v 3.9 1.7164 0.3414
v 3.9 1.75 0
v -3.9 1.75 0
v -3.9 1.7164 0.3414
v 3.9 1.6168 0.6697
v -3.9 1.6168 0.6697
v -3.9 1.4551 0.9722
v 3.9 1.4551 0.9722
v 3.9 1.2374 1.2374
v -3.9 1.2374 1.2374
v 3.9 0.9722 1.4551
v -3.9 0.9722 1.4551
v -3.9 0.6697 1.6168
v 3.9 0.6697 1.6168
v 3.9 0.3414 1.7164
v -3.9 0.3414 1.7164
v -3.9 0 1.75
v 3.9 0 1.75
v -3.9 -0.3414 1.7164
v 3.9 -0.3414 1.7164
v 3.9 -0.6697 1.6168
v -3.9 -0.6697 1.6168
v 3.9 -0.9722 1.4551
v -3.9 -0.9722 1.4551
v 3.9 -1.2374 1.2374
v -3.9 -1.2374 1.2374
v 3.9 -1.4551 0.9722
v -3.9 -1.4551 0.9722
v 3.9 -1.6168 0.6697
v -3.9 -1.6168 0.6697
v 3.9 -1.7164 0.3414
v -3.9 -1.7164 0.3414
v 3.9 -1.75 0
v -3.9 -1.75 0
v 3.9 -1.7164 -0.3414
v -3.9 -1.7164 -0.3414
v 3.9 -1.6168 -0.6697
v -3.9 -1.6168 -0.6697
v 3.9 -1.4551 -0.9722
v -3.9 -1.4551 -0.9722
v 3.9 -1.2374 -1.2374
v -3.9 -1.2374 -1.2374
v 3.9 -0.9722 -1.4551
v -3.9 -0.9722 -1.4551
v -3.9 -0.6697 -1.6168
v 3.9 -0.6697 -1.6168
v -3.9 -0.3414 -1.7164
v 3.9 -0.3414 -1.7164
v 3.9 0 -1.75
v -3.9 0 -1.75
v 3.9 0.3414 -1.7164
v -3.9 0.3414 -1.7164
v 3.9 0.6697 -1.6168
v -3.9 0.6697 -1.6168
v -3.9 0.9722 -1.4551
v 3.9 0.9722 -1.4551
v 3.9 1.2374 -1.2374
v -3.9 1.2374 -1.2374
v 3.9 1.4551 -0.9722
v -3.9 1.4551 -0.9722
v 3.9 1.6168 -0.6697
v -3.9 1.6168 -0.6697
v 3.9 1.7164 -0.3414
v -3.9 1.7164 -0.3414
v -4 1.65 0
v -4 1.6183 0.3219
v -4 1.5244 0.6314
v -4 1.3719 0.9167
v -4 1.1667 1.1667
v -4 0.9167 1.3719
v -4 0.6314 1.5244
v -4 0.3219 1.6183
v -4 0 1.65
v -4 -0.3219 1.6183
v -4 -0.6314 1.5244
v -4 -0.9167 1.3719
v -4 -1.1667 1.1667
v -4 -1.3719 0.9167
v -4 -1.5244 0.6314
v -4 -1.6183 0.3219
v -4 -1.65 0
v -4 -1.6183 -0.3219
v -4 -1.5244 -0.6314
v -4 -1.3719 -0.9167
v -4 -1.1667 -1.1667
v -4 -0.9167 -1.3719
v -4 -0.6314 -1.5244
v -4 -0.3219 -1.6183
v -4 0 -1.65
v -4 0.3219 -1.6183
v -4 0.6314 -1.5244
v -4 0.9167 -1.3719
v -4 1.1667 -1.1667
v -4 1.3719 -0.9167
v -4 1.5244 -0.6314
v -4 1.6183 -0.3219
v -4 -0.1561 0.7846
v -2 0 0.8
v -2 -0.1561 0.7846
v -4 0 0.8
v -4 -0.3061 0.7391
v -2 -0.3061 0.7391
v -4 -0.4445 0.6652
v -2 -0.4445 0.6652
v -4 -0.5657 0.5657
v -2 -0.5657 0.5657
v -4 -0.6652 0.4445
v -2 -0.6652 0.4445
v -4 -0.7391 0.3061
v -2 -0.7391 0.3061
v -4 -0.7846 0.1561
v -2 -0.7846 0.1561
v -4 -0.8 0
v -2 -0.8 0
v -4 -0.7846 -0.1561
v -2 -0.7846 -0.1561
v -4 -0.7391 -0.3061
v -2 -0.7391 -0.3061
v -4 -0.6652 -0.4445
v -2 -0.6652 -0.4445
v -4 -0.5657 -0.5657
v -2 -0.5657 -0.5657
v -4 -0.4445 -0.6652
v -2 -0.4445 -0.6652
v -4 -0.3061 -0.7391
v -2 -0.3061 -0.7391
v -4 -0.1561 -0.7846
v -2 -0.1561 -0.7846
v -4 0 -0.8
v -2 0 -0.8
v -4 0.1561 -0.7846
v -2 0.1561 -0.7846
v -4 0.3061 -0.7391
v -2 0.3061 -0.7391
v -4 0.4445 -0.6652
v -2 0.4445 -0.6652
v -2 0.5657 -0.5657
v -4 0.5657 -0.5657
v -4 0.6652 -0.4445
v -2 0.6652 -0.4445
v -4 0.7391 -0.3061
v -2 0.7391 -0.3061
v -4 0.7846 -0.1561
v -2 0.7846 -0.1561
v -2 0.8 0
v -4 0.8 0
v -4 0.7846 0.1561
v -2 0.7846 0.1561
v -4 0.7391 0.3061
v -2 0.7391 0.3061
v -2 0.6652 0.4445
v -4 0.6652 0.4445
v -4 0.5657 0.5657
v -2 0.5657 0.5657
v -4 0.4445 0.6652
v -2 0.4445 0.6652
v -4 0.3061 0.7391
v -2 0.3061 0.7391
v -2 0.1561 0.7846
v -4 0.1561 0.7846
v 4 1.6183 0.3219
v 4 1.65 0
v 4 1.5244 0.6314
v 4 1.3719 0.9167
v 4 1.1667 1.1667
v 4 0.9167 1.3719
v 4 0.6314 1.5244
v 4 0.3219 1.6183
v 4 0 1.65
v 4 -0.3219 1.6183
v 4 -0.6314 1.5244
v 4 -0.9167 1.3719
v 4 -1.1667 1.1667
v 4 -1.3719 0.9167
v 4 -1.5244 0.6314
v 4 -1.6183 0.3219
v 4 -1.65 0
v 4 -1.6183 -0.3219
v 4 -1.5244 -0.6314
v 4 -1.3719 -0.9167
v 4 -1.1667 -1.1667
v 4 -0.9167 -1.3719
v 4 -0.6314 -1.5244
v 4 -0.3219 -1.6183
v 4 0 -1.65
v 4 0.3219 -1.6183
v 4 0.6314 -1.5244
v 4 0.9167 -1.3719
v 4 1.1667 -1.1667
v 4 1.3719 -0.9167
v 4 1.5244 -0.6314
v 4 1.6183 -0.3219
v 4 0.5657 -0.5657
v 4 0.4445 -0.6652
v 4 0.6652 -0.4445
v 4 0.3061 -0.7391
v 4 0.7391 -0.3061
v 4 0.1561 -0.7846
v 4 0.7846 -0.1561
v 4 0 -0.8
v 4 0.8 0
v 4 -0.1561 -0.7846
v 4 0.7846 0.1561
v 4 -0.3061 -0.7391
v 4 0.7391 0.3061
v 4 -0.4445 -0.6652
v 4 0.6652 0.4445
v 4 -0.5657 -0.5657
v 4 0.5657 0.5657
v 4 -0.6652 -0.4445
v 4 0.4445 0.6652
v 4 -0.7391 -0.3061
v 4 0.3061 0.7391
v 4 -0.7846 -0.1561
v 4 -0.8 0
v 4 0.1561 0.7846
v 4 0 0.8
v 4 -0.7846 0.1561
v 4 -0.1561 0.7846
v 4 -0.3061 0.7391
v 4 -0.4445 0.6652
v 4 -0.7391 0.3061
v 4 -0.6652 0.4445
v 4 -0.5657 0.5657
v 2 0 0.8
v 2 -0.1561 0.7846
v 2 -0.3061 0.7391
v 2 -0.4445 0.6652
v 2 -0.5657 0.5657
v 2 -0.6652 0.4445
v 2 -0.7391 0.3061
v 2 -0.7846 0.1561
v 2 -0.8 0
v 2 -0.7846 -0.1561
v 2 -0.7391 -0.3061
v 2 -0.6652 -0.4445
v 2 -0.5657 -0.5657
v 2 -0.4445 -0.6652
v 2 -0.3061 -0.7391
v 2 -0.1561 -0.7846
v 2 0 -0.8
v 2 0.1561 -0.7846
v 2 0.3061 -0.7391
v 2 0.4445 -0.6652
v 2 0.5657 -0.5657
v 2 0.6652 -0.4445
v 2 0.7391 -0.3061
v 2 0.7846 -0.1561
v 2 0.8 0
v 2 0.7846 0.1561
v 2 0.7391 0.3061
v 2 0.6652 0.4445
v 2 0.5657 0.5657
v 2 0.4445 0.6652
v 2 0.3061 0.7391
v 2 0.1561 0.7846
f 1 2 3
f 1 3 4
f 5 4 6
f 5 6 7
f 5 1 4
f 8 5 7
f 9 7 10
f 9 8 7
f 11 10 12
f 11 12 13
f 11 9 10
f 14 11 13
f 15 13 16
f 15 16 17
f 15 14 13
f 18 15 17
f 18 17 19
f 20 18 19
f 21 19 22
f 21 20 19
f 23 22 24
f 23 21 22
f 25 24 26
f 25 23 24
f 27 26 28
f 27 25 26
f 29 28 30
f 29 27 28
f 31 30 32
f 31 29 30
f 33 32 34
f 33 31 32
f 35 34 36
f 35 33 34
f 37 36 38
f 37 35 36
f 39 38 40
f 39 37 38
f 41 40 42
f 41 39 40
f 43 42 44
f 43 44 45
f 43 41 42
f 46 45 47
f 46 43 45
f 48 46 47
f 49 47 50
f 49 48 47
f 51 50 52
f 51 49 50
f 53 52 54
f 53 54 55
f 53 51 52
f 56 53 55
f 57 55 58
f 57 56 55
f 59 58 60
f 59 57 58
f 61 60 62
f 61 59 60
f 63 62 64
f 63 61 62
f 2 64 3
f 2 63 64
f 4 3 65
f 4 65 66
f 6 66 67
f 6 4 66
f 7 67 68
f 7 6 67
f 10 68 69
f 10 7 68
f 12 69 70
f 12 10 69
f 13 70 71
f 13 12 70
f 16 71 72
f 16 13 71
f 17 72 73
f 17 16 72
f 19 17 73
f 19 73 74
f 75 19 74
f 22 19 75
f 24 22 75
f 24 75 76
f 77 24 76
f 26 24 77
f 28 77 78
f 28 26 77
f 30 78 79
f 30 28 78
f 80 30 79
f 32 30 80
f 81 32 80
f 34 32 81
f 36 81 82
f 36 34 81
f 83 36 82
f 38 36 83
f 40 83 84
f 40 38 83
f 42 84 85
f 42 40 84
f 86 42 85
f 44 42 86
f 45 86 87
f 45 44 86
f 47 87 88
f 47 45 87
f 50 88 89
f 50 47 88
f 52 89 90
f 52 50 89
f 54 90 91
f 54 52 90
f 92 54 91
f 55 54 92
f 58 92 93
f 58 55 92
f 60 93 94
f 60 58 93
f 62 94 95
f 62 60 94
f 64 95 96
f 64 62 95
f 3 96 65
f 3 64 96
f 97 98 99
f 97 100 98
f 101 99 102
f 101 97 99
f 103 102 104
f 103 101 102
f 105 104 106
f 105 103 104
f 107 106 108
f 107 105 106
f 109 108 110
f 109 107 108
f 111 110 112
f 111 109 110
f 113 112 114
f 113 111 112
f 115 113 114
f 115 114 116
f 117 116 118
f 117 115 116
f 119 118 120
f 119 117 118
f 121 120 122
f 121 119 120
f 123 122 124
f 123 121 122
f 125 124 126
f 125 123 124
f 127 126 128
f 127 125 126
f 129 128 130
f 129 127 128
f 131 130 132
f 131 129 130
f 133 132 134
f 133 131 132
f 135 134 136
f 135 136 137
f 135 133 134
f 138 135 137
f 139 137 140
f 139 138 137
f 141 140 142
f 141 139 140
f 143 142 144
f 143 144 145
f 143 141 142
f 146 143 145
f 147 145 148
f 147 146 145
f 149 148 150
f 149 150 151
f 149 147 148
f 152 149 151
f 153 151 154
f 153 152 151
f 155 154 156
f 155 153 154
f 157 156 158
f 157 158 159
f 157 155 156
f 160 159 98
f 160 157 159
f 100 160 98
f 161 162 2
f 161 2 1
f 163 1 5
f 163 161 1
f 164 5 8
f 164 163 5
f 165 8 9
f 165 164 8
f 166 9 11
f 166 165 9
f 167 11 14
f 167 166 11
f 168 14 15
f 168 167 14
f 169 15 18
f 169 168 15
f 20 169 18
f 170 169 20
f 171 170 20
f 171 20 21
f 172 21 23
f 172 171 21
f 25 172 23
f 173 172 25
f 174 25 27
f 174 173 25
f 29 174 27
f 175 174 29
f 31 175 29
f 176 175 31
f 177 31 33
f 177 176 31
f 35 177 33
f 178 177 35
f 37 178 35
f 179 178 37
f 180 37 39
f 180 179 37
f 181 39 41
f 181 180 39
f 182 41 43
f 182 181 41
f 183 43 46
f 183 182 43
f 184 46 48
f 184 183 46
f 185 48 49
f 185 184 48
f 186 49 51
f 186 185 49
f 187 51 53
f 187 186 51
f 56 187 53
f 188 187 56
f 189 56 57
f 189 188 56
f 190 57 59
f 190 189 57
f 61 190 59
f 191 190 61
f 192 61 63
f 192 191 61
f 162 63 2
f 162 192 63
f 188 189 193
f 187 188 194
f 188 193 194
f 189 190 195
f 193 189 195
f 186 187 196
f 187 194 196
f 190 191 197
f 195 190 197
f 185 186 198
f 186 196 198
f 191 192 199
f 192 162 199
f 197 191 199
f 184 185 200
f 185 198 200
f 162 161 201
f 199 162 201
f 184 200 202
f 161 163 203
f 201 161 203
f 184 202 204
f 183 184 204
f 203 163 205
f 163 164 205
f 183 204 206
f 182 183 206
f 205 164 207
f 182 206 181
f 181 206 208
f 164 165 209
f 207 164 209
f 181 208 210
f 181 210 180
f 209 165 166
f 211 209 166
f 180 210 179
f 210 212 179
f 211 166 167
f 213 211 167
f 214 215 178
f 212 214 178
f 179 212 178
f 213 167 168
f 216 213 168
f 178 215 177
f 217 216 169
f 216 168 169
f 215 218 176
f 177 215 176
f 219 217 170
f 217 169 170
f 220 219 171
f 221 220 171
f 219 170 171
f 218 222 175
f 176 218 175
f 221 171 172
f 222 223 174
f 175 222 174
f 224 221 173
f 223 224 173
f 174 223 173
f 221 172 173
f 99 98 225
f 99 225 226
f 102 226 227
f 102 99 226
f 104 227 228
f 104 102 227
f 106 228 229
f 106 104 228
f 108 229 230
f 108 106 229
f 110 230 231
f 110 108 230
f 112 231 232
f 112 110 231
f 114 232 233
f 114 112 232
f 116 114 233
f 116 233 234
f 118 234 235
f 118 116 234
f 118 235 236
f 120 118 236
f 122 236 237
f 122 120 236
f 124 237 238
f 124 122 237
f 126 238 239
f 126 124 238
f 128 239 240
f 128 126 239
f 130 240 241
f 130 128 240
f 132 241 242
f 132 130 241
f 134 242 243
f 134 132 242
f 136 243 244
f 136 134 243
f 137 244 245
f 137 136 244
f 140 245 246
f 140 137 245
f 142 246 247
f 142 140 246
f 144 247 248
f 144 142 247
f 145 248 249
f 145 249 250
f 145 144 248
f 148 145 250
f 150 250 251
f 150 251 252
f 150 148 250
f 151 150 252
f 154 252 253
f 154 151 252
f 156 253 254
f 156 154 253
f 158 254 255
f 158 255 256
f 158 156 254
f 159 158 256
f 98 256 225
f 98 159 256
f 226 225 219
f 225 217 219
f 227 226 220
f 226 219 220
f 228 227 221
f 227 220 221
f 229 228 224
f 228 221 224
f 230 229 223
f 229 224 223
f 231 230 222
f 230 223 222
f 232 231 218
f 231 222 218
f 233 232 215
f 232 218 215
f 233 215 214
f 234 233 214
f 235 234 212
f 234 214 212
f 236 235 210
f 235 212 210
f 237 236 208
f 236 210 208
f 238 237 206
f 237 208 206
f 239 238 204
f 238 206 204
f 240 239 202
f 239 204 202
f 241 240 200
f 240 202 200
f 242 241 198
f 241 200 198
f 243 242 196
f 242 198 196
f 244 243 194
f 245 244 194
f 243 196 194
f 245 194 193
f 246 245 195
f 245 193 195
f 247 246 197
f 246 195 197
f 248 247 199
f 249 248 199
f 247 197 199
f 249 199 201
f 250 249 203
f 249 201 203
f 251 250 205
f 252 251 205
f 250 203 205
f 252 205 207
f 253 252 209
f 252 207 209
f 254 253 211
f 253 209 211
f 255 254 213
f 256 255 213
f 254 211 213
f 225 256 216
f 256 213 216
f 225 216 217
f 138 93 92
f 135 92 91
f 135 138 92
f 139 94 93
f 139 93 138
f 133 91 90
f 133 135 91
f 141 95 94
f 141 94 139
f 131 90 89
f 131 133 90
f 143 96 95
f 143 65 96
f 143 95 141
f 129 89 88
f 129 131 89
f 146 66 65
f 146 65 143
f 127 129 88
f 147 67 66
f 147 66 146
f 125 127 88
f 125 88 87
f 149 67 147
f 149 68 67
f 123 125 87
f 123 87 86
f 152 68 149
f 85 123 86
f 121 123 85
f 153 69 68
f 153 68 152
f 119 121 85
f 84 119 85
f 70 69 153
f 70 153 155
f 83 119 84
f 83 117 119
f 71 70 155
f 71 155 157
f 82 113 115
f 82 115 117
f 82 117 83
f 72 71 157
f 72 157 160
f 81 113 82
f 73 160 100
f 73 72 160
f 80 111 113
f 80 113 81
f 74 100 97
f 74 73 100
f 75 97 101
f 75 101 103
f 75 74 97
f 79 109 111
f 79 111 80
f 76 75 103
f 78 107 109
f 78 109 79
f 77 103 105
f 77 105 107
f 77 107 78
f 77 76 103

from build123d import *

# Parameters (mm, degrees)
SKETCH_1_W     = 8
SKETCH_1_H     = 1.75
CHAMFER_1_SIZE = 0.1


with BuildPart() as part:
    # 草图1 → 旋转1 (revolve)
    with BuildSketch(Plane.XY):
        with Locations((0, 0.875)):
            Rectangle(SKETCH_1_W, SKETCH_1_H)
    revolve(axis=Axis((-4, 0, 0), (1, 0, 0)))

    # 草图3 → Hole Wizard 380 (revolve, cut)
    with BuildSketch(Plane(origin=(-4, 0, 0), x_dir=(0, 0, 1), z_dir=(0, 1, 0))):
        Polygon((0, 0), (0, 6.480688495), (0.8, 6), (0.8, 0), align=None)
    hole_wizard_380 = revolve(axis=Axis((-10.35, 0, 0), (1, 0, 0)), mode=Mode.SUBTRACT)

    # 镜向1: Hole Wizard 380 across plane
    add(hole_wizard_380.mirror(Plane(origin=(0, 0, 0), x_dir=(0, 0, 1), z_dir=(1, 0, 0))), mode=Mode.SUBTRACT)

    # 倒角1
    chamfer_1_edges = [part.edges().sort_by_distance(p)[0] for p in [
        (-4, -1.75, 0),
        (4, -1.75, 0),
    ]]
    chamfer(chamfer_1_edges, length=CHAMFER_1_SIZE)


solid = part.part
